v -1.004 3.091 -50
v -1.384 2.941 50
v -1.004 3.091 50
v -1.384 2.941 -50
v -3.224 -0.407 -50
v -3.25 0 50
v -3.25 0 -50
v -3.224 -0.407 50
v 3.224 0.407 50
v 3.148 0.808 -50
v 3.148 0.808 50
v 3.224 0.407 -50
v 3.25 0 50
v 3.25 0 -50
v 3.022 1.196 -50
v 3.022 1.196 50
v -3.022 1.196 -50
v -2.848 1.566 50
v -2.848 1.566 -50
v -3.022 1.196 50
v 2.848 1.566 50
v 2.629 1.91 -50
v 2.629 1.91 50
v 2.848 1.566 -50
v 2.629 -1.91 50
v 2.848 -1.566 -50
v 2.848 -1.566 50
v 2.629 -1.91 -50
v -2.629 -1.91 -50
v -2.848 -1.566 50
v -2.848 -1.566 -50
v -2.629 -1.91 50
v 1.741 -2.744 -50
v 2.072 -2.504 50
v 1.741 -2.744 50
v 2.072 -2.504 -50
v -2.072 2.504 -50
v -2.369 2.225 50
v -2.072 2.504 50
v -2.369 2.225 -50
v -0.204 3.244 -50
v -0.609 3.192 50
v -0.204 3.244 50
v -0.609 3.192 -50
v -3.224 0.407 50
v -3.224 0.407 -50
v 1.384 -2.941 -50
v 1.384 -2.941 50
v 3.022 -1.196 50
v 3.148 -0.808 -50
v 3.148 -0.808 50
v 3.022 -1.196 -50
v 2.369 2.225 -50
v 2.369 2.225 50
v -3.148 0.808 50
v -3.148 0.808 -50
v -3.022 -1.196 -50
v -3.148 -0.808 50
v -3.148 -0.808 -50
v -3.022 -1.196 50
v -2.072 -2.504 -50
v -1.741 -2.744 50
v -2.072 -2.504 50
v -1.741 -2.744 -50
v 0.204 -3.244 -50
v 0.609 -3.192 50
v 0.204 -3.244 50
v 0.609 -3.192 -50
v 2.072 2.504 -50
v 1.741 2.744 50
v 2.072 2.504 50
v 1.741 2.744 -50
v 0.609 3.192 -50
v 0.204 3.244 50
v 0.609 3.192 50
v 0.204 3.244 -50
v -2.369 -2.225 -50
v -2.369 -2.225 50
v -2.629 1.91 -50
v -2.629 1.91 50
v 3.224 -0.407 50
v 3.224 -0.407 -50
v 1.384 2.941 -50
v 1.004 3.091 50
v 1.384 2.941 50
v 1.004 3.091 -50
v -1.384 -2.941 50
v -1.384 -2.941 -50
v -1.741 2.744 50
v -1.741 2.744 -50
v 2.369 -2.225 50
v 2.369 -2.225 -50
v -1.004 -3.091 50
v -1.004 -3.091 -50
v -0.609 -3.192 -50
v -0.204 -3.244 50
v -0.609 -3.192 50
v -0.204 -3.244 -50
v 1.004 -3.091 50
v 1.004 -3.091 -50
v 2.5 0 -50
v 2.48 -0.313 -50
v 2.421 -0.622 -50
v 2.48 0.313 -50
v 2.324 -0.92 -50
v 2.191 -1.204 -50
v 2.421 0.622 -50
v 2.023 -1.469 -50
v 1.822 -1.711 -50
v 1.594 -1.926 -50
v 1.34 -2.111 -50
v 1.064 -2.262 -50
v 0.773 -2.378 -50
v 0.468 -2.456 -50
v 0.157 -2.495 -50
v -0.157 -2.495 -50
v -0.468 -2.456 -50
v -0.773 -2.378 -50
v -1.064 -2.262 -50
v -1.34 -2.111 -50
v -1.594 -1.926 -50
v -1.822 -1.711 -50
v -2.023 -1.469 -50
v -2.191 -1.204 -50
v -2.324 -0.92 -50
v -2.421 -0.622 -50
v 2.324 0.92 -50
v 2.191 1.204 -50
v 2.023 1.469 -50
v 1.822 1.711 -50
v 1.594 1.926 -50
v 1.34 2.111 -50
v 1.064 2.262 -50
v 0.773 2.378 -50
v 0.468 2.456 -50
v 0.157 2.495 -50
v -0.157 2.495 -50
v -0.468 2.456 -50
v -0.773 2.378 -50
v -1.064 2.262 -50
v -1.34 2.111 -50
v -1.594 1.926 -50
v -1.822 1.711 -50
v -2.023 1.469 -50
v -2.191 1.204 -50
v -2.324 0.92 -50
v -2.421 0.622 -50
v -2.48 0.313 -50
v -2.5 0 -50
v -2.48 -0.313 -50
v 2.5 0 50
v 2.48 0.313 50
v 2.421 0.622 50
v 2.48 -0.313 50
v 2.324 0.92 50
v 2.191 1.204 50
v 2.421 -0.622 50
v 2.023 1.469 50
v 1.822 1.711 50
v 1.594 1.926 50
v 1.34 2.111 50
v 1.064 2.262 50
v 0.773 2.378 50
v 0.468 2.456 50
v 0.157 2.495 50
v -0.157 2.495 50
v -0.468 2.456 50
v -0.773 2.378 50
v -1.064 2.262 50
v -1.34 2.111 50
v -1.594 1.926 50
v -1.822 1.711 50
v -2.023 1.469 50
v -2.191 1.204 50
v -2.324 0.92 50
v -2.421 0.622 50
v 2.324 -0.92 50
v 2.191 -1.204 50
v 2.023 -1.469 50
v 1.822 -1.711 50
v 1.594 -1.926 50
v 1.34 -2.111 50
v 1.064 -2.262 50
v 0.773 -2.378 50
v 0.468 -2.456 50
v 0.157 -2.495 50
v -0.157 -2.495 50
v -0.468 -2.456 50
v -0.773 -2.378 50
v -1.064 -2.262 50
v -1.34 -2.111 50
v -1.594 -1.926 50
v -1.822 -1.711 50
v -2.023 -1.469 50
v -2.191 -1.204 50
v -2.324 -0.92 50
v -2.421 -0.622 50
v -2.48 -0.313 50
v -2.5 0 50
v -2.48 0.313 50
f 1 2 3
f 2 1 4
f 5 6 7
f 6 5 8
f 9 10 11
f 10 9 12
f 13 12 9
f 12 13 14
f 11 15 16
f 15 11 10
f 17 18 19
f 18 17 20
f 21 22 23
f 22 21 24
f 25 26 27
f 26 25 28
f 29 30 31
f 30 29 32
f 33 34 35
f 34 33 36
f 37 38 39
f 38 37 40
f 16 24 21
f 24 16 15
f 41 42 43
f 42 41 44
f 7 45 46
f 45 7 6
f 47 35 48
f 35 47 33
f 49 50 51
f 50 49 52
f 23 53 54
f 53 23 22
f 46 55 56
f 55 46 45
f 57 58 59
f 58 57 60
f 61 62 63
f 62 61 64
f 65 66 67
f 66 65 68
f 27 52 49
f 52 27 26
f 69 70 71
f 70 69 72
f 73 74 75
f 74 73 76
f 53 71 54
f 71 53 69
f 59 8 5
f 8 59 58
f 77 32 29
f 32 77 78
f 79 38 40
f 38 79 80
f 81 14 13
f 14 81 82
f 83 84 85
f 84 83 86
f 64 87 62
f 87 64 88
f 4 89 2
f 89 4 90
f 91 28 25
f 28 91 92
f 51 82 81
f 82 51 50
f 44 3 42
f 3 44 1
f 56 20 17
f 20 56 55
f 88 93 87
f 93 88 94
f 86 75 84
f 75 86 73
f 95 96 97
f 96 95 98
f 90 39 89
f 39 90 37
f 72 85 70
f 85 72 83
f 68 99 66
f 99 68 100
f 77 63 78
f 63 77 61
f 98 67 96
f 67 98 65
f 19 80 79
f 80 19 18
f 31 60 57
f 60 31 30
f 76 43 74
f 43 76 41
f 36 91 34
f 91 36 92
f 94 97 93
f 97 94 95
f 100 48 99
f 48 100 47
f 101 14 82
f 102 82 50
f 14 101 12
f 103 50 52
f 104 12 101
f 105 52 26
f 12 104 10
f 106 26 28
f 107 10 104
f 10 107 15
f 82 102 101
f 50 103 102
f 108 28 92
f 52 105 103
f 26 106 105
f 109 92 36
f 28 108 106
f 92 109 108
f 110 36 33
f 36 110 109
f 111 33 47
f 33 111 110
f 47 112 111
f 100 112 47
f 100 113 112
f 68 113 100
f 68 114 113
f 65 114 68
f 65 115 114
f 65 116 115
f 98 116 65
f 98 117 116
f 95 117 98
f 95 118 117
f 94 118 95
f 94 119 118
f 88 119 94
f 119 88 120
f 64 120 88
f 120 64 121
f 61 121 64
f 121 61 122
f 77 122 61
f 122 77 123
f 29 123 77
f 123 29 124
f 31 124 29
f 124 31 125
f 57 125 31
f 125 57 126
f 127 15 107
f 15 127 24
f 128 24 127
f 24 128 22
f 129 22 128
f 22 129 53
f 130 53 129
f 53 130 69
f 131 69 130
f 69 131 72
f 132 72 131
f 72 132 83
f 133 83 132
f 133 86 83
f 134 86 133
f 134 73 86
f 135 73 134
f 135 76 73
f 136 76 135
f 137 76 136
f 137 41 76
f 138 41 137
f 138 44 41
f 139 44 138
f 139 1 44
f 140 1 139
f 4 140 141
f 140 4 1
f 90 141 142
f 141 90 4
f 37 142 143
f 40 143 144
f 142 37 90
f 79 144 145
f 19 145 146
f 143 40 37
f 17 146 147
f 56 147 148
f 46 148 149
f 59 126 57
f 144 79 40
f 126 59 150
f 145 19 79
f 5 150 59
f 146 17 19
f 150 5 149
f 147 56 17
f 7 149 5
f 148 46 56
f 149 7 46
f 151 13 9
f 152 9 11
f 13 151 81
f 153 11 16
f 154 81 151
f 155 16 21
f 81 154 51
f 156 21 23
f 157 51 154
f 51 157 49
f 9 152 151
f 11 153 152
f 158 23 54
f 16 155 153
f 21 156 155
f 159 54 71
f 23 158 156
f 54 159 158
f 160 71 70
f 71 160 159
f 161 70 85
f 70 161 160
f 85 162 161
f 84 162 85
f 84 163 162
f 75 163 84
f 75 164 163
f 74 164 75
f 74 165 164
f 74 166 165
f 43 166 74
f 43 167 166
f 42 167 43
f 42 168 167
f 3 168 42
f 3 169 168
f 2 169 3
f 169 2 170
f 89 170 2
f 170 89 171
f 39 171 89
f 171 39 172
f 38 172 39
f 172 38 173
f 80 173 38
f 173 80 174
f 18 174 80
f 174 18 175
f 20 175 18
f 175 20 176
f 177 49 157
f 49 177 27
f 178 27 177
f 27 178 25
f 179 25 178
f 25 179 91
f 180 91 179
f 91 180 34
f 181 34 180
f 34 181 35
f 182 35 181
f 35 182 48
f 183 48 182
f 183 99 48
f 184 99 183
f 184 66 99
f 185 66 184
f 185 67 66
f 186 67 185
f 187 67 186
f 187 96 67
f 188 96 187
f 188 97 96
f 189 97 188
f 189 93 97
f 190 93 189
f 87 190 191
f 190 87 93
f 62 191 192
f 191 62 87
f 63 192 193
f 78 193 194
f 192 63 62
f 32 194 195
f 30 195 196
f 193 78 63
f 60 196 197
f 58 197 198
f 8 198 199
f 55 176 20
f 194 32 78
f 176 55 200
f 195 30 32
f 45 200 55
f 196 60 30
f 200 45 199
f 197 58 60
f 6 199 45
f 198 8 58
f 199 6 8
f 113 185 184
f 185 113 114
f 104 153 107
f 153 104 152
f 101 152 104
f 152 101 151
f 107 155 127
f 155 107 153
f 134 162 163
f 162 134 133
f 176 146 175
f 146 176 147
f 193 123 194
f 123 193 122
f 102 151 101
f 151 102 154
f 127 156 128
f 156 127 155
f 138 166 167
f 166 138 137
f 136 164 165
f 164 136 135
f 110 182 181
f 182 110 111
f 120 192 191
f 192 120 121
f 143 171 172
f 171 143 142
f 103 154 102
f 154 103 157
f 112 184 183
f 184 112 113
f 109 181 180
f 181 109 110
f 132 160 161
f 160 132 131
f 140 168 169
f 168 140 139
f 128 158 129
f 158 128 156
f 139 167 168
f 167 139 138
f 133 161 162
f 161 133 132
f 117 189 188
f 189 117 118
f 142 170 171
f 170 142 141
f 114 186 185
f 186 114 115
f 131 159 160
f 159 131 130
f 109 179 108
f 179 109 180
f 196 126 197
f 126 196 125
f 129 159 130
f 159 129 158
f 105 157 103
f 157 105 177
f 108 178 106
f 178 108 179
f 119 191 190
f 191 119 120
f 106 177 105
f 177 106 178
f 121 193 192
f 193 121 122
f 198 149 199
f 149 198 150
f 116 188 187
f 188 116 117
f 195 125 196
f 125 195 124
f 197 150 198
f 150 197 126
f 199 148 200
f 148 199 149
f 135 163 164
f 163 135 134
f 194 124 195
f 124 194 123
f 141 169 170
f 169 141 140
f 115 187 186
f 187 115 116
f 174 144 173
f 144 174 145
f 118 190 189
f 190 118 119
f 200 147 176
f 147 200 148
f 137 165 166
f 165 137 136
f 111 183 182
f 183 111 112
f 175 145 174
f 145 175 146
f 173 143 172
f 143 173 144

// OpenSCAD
$fn = 50;


difference() {
	union() {
		translate(v = [0, 0, -50.0000000000]) {
			cylinder(h = 100, r = 3.2500000000);
		}
	}
	union() {
		translate(v = [0, 0, -100.0000000000]) {
			cylinder(h = 200, r = 2.5000000000);
		}
	}
}
